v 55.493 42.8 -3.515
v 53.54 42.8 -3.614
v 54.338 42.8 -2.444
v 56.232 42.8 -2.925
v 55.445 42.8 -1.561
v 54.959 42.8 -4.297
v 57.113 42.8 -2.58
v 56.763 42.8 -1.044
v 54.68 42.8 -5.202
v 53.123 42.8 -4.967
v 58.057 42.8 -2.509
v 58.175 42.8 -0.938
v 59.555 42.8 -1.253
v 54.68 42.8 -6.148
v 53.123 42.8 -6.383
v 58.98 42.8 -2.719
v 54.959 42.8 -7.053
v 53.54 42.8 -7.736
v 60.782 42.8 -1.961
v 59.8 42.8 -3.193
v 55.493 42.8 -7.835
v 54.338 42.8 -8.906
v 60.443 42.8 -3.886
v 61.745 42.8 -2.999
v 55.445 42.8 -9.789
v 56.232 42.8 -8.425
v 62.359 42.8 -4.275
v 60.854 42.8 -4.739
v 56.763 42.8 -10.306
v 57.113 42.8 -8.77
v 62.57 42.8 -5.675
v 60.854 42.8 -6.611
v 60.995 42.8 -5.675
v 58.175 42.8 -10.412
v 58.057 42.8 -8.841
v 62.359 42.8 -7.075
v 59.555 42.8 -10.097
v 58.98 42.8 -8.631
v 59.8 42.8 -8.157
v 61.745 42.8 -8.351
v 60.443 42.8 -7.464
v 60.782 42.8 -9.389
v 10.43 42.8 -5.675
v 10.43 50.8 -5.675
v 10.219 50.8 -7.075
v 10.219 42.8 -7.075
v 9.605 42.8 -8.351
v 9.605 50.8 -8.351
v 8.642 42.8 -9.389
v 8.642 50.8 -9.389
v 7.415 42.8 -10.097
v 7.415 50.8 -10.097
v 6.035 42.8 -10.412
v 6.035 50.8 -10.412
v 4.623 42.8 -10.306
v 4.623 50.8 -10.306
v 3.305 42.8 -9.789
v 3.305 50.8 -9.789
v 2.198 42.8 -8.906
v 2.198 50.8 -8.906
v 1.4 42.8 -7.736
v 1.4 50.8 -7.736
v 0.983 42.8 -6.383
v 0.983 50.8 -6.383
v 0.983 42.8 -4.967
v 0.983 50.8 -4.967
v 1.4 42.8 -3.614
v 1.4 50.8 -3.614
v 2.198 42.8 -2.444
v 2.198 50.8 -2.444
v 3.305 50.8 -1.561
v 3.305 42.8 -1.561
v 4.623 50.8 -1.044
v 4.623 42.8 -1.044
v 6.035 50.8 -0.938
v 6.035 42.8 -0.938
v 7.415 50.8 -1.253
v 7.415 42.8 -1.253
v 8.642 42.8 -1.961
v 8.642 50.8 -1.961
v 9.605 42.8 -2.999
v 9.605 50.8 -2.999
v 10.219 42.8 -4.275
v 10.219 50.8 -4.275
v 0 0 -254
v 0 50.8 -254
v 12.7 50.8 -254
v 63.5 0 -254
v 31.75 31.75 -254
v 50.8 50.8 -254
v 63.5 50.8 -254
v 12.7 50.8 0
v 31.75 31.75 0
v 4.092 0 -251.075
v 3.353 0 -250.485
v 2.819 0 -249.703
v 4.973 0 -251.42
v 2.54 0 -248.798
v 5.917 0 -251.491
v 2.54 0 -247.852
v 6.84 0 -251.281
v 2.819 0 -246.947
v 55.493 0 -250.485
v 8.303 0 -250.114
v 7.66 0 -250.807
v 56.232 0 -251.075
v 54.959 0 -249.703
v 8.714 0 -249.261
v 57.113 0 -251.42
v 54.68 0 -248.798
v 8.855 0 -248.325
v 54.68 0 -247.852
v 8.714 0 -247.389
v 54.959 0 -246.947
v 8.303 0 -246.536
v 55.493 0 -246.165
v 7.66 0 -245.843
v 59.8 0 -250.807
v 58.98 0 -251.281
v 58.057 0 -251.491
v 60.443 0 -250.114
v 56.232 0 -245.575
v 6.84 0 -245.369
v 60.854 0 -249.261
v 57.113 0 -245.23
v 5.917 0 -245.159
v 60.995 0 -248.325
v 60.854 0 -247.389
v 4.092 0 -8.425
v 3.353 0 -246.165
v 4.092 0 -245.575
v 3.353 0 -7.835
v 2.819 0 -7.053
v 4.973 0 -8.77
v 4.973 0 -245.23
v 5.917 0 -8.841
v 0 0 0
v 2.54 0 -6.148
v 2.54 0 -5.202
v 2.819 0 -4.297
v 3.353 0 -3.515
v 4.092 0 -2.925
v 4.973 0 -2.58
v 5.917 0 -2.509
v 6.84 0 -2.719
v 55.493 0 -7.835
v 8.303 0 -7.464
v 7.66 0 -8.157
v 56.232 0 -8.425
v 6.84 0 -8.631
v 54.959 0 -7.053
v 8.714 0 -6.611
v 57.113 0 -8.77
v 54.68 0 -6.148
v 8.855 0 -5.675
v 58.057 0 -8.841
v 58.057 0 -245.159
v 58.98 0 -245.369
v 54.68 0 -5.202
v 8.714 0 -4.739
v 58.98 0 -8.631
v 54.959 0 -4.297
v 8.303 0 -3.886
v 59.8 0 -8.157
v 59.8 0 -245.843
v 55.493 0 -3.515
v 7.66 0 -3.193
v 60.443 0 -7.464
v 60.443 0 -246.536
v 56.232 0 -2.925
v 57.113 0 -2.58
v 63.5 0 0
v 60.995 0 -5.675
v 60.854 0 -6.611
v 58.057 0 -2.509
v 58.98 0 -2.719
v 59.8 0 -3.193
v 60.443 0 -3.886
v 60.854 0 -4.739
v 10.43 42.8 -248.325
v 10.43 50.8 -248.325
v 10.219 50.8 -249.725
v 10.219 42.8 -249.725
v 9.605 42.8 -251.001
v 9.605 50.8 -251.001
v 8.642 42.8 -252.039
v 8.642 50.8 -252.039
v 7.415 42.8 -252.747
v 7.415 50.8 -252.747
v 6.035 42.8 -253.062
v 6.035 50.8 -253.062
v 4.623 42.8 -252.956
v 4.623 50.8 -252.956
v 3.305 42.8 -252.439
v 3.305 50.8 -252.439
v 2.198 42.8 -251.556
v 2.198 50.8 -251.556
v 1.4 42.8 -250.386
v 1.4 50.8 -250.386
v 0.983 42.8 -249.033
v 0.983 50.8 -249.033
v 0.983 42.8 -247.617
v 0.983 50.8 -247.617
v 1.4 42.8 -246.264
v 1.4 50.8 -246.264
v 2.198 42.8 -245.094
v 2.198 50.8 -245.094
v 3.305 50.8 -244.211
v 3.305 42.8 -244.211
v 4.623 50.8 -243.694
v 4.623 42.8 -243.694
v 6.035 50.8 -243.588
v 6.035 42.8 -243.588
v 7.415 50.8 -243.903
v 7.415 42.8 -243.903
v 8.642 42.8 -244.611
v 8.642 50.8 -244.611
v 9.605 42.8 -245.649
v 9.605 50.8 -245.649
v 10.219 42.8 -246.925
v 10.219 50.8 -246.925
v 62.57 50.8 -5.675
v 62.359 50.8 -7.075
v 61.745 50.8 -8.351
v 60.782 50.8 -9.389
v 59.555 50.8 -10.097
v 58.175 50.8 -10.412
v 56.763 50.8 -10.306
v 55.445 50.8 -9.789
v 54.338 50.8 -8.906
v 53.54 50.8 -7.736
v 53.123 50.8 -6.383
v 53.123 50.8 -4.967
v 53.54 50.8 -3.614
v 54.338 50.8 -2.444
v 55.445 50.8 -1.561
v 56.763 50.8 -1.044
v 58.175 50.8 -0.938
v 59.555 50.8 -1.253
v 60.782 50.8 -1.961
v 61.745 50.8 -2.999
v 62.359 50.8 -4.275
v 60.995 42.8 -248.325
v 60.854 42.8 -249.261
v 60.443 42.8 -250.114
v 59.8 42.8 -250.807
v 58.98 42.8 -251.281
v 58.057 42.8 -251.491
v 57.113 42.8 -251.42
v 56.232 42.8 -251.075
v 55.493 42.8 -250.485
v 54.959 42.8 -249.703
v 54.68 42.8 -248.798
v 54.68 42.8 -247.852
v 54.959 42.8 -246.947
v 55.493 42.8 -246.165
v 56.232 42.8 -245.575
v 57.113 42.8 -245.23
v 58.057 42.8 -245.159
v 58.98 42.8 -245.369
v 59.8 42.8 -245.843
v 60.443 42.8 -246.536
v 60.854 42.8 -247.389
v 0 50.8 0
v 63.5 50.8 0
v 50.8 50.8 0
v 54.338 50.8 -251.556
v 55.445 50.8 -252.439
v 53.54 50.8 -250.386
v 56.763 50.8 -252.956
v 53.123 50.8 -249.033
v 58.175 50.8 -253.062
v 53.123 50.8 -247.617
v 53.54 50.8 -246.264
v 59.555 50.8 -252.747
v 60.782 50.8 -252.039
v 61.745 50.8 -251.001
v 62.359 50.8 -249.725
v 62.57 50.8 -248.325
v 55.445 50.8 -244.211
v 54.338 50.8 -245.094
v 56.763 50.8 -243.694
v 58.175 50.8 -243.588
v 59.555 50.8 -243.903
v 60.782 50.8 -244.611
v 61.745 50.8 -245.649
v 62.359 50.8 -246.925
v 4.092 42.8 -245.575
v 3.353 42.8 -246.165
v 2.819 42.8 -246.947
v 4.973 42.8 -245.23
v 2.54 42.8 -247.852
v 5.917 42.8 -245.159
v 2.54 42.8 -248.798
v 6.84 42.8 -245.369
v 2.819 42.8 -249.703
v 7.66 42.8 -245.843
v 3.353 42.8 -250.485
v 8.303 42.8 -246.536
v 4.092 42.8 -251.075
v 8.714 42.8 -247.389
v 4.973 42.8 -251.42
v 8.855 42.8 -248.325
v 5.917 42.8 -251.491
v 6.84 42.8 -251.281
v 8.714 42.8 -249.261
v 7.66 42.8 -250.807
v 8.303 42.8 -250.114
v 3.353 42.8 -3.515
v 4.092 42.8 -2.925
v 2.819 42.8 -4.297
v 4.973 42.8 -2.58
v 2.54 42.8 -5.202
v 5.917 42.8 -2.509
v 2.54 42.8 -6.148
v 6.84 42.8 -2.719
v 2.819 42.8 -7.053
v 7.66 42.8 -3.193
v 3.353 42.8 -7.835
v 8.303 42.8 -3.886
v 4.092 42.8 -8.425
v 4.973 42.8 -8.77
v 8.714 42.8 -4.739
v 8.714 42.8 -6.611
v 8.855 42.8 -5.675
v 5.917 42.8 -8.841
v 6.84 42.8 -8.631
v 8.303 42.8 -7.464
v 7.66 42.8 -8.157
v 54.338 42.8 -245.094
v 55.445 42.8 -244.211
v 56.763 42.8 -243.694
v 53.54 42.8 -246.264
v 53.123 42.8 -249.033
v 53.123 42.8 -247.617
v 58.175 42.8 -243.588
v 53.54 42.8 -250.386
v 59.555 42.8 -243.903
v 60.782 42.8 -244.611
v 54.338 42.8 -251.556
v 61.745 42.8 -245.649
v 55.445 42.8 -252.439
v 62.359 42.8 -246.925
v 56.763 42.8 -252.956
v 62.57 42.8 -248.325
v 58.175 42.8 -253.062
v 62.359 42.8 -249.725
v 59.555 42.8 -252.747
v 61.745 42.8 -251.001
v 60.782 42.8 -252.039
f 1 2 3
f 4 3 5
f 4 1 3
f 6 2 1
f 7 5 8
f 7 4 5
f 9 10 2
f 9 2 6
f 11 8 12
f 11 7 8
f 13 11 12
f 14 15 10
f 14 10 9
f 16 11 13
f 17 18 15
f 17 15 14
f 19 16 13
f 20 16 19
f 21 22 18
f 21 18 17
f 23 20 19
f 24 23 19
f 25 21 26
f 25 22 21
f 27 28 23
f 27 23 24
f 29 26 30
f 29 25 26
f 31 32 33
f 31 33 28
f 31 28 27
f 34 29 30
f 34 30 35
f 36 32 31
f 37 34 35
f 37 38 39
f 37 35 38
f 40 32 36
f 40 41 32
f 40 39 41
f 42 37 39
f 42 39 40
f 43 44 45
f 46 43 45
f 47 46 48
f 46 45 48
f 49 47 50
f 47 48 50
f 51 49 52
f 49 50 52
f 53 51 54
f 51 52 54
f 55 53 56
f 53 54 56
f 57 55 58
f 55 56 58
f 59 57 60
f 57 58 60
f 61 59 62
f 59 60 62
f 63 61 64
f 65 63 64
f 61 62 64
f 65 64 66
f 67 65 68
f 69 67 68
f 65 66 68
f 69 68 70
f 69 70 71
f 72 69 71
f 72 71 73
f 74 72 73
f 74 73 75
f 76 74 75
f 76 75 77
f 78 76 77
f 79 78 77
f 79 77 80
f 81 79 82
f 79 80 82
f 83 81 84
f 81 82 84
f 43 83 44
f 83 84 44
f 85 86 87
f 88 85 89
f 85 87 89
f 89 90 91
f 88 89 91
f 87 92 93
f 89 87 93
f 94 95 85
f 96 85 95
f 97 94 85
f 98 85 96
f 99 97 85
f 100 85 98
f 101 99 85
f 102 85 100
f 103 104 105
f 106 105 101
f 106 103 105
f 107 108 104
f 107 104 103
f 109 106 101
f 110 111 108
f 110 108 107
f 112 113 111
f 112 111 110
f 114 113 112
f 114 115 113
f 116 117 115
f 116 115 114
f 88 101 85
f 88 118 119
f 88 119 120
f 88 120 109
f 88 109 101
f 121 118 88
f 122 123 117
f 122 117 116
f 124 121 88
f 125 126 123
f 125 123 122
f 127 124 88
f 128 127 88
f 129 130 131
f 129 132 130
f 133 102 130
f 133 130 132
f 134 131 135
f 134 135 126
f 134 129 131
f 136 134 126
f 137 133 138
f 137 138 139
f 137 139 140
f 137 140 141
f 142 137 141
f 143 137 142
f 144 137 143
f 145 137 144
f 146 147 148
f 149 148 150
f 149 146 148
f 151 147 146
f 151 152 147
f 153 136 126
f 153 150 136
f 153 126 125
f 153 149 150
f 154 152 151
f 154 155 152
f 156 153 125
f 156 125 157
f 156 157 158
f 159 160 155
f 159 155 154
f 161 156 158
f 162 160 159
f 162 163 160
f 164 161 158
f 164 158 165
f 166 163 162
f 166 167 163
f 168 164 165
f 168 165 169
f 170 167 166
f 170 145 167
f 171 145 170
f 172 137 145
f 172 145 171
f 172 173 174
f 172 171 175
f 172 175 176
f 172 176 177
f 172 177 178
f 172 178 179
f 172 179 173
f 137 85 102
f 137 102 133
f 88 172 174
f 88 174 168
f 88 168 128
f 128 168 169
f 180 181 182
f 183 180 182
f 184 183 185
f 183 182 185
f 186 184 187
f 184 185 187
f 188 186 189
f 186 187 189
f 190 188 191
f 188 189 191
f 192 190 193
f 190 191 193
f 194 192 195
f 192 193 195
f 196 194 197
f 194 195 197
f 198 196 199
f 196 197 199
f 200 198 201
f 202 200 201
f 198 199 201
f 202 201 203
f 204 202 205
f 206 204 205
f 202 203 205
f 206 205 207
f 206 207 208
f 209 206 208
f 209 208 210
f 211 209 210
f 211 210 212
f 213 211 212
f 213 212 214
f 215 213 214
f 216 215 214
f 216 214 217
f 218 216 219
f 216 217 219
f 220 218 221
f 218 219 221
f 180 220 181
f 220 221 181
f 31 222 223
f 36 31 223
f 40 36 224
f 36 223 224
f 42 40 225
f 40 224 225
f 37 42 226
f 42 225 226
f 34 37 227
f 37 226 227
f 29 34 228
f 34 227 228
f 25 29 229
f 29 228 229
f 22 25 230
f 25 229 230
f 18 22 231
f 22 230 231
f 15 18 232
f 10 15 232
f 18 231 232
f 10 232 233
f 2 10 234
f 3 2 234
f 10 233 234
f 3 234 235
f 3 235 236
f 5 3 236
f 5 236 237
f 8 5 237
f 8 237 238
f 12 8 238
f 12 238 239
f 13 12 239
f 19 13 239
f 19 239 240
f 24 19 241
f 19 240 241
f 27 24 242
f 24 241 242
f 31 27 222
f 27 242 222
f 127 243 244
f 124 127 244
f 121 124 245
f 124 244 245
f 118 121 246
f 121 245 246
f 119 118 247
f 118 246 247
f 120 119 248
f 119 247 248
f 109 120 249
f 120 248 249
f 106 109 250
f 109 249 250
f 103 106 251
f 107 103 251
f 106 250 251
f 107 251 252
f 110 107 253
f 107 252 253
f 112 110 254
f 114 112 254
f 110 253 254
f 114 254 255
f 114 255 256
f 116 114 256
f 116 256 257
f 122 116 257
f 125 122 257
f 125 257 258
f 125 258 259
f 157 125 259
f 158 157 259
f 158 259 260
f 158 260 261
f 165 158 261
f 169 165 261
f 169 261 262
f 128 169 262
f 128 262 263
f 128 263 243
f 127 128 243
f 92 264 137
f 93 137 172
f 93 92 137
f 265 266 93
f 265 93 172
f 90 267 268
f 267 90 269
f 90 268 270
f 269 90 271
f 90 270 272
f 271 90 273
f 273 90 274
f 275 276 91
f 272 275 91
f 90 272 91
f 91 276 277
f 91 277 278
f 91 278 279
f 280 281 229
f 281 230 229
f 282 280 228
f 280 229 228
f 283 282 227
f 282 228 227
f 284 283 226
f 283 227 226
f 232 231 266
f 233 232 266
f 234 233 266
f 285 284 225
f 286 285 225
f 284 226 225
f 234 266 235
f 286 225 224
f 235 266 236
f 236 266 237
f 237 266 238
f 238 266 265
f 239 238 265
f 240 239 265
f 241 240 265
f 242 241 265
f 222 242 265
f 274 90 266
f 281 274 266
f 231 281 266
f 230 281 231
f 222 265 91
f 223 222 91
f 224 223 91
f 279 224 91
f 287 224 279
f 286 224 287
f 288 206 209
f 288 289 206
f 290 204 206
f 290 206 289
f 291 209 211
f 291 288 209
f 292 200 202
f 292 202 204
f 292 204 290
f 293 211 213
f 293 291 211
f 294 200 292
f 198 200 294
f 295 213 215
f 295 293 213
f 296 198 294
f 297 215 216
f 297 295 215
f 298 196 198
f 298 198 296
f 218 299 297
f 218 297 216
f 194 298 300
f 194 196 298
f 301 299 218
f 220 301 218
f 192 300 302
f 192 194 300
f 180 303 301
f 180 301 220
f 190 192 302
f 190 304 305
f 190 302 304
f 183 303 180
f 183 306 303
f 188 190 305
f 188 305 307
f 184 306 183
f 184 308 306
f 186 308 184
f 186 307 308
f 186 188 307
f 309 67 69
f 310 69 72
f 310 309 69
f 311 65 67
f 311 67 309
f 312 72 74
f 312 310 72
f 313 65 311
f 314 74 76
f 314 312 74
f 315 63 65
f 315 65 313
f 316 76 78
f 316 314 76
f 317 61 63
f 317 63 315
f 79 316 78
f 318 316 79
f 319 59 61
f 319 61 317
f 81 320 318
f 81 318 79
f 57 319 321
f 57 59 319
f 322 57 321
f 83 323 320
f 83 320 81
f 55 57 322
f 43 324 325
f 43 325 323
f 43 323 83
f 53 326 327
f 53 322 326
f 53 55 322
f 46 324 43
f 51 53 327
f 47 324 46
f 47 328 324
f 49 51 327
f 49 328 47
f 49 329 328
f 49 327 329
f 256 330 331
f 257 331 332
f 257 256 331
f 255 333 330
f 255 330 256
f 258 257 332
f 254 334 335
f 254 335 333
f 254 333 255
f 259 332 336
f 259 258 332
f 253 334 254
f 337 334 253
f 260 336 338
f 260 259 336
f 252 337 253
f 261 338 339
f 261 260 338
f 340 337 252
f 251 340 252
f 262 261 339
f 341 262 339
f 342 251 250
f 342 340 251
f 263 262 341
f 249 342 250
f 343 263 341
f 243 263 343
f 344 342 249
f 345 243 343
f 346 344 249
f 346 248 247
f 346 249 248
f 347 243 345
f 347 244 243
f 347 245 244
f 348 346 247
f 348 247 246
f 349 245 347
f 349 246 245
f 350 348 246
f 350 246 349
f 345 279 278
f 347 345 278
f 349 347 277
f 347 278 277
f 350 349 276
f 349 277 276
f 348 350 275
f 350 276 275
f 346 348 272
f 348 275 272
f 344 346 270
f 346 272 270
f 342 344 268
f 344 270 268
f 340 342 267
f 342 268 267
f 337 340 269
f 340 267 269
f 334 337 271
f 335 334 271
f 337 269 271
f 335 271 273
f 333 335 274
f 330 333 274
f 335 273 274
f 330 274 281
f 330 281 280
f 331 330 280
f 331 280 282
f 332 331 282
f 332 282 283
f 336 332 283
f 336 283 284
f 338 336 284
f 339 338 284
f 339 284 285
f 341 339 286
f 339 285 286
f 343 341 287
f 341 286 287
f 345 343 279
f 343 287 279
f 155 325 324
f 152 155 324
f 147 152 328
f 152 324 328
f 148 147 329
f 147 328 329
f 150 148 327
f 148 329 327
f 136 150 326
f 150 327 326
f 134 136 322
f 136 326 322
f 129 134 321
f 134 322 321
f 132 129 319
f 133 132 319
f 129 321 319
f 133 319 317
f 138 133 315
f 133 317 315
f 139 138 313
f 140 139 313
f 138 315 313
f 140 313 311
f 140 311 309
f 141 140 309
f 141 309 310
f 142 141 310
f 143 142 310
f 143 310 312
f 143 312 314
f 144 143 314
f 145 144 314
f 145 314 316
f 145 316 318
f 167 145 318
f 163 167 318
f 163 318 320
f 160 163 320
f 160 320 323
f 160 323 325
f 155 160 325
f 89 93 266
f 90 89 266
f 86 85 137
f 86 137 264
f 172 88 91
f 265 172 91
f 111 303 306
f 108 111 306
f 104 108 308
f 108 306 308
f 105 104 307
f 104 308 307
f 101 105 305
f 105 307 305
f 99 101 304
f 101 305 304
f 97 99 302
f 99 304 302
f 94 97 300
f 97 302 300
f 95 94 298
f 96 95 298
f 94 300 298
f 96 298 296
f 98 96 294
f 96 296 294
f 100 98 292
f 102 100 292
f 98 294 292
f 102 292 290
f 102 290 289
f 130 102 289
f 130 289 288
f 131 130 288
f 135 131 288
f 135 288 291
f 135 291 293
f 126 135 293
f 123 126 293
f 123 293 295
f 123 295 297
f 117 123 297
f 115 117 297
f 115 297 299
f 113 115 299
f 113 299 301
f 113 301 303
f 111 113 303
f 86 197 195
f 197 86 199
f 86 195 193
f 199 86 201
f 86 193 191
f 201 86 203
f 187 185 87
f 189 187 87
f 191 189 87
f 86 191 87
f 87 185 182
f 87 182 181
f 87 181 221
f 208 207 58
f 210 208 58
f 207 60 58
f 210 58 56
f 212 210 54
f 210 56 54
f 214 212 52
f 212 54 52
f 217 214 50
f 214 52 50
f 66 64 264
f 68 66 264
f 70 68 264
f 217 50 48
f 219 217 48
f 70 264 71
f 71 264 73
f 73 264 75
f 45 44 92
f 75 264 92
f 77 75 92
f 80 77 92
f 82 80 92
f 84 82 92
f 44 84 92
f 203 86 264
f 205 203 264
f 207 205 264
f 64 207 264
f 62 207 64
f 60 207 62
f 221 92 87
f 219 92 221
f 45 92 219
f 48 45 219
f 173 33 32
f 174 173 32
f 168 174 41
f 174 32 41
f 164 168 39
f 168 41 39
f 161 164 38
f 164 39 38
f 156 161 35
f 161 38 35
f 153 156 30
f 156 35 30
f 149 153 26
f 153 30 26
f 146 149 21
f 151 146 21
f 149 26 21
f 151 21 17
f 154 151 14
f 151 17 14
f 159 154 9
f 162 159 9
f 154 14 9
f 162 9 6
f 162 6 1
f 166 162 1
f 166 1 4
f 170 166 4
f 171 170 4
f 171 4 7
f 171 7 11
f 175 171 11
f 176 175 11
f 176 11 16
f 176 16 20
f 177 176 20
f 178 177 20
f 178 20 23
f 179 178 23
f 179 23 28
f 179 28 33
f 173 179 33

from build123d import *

# Parameters (mm, degrees)
CROQUIS2_W              = 63.5
CROQUIS2_H              = 50.8
SALIENTE_EXTRUIR1_DEPTH = 254
CROQUIS5_R              = 3.175
CORTAR_EXTRUIR3_DEPTH   = 50.8
CROQUIS10_R             = 4.75
CORTAR_EXTRUIR5_DEPTH   = 8
CORTAR_EXTRUIR6_DEPTH   = 254
CROQUIS12_R             = 4.75
CORTAR_EXTRUIR7_DEPTH   = 8


with BuildPart() as part:
    # Croquis2 → Saliente-Extruir1 (new body)
    with BuildSketch(Plane.XY):
        with Locations((31.75, 25.4)):
            Rectangle(CROQUIS2_W, CROQUIS2_H)
    extrude(amount=-SALIENTE_EXTRUIR1_DEPTH)

    # Croquis5 → Cortar-Extruir3 (cut)
    with BuildSketch(Plane(origin=(0, 50.8, 0), x_dir=(1, 0, 0), z_dir=(0, 1, 0))):
        with Locations((57.82, 5.675)):
            Circle(CROQUIS5_R)
        with Locations((5.68, 5.675)):
            Circle(CROQUIS5_R)
        with Locations((5.68, 248.325)):
            Circle(CROQUIS5_R)
        with Locations((57.82, 248.325)):
            Circle(CROQUIS5_R)
    extrude(amount=-CORTAR_EXTRUIR3_DEPTH, mode=Mode.SUBTRACT)

    # Croquis10 → Cortar-Extruir5 (cut)
    with BuildSketch(Plane(origin=(0, 50.8, 0), x_dir=(1, 0, 0), z_dir=(0, 1, 0))):
        with Locations((57.82, 5.675)):
            Circle(CROQUIS10_R)
        with Locations((5.68, 5.675)):
            Circle(CROQUIS10_R)
    extrude(amount=-CORTAR_EXTRUIR5_DEPTH, mode=Mode.SUBTRACT)

    # Croquis11 → Cortar-Extruir6 (cut)
    with BuildSketch(Plane.XY):
        Polygon((31.75, 31.75), (50.8, 50.8), (12.7, 50.8), align=None)
    extrude(amount=-CORTAR_EXTRUIR6_DEPTH, mode=Mode.SUBTRACT)

    # Croquis12 → Cortar-Extruir7 (cut)
    with BuildSketch(Plane(origin=(0, 50.8, 0), x_dir=(1, 0, 0), z_dir=(0, 1, 0))):
        with Locations((57.82, 248.325)):
            Circle(CROQUIS12_R)
        with Locations((5.68, 248.325)):
            Circle(CROQUIS12_R)
    extrude(amount=-CORTAR_EXTRUIR7_DEPTH, mode=Mode.SUBTRACT)


solid = part.part
